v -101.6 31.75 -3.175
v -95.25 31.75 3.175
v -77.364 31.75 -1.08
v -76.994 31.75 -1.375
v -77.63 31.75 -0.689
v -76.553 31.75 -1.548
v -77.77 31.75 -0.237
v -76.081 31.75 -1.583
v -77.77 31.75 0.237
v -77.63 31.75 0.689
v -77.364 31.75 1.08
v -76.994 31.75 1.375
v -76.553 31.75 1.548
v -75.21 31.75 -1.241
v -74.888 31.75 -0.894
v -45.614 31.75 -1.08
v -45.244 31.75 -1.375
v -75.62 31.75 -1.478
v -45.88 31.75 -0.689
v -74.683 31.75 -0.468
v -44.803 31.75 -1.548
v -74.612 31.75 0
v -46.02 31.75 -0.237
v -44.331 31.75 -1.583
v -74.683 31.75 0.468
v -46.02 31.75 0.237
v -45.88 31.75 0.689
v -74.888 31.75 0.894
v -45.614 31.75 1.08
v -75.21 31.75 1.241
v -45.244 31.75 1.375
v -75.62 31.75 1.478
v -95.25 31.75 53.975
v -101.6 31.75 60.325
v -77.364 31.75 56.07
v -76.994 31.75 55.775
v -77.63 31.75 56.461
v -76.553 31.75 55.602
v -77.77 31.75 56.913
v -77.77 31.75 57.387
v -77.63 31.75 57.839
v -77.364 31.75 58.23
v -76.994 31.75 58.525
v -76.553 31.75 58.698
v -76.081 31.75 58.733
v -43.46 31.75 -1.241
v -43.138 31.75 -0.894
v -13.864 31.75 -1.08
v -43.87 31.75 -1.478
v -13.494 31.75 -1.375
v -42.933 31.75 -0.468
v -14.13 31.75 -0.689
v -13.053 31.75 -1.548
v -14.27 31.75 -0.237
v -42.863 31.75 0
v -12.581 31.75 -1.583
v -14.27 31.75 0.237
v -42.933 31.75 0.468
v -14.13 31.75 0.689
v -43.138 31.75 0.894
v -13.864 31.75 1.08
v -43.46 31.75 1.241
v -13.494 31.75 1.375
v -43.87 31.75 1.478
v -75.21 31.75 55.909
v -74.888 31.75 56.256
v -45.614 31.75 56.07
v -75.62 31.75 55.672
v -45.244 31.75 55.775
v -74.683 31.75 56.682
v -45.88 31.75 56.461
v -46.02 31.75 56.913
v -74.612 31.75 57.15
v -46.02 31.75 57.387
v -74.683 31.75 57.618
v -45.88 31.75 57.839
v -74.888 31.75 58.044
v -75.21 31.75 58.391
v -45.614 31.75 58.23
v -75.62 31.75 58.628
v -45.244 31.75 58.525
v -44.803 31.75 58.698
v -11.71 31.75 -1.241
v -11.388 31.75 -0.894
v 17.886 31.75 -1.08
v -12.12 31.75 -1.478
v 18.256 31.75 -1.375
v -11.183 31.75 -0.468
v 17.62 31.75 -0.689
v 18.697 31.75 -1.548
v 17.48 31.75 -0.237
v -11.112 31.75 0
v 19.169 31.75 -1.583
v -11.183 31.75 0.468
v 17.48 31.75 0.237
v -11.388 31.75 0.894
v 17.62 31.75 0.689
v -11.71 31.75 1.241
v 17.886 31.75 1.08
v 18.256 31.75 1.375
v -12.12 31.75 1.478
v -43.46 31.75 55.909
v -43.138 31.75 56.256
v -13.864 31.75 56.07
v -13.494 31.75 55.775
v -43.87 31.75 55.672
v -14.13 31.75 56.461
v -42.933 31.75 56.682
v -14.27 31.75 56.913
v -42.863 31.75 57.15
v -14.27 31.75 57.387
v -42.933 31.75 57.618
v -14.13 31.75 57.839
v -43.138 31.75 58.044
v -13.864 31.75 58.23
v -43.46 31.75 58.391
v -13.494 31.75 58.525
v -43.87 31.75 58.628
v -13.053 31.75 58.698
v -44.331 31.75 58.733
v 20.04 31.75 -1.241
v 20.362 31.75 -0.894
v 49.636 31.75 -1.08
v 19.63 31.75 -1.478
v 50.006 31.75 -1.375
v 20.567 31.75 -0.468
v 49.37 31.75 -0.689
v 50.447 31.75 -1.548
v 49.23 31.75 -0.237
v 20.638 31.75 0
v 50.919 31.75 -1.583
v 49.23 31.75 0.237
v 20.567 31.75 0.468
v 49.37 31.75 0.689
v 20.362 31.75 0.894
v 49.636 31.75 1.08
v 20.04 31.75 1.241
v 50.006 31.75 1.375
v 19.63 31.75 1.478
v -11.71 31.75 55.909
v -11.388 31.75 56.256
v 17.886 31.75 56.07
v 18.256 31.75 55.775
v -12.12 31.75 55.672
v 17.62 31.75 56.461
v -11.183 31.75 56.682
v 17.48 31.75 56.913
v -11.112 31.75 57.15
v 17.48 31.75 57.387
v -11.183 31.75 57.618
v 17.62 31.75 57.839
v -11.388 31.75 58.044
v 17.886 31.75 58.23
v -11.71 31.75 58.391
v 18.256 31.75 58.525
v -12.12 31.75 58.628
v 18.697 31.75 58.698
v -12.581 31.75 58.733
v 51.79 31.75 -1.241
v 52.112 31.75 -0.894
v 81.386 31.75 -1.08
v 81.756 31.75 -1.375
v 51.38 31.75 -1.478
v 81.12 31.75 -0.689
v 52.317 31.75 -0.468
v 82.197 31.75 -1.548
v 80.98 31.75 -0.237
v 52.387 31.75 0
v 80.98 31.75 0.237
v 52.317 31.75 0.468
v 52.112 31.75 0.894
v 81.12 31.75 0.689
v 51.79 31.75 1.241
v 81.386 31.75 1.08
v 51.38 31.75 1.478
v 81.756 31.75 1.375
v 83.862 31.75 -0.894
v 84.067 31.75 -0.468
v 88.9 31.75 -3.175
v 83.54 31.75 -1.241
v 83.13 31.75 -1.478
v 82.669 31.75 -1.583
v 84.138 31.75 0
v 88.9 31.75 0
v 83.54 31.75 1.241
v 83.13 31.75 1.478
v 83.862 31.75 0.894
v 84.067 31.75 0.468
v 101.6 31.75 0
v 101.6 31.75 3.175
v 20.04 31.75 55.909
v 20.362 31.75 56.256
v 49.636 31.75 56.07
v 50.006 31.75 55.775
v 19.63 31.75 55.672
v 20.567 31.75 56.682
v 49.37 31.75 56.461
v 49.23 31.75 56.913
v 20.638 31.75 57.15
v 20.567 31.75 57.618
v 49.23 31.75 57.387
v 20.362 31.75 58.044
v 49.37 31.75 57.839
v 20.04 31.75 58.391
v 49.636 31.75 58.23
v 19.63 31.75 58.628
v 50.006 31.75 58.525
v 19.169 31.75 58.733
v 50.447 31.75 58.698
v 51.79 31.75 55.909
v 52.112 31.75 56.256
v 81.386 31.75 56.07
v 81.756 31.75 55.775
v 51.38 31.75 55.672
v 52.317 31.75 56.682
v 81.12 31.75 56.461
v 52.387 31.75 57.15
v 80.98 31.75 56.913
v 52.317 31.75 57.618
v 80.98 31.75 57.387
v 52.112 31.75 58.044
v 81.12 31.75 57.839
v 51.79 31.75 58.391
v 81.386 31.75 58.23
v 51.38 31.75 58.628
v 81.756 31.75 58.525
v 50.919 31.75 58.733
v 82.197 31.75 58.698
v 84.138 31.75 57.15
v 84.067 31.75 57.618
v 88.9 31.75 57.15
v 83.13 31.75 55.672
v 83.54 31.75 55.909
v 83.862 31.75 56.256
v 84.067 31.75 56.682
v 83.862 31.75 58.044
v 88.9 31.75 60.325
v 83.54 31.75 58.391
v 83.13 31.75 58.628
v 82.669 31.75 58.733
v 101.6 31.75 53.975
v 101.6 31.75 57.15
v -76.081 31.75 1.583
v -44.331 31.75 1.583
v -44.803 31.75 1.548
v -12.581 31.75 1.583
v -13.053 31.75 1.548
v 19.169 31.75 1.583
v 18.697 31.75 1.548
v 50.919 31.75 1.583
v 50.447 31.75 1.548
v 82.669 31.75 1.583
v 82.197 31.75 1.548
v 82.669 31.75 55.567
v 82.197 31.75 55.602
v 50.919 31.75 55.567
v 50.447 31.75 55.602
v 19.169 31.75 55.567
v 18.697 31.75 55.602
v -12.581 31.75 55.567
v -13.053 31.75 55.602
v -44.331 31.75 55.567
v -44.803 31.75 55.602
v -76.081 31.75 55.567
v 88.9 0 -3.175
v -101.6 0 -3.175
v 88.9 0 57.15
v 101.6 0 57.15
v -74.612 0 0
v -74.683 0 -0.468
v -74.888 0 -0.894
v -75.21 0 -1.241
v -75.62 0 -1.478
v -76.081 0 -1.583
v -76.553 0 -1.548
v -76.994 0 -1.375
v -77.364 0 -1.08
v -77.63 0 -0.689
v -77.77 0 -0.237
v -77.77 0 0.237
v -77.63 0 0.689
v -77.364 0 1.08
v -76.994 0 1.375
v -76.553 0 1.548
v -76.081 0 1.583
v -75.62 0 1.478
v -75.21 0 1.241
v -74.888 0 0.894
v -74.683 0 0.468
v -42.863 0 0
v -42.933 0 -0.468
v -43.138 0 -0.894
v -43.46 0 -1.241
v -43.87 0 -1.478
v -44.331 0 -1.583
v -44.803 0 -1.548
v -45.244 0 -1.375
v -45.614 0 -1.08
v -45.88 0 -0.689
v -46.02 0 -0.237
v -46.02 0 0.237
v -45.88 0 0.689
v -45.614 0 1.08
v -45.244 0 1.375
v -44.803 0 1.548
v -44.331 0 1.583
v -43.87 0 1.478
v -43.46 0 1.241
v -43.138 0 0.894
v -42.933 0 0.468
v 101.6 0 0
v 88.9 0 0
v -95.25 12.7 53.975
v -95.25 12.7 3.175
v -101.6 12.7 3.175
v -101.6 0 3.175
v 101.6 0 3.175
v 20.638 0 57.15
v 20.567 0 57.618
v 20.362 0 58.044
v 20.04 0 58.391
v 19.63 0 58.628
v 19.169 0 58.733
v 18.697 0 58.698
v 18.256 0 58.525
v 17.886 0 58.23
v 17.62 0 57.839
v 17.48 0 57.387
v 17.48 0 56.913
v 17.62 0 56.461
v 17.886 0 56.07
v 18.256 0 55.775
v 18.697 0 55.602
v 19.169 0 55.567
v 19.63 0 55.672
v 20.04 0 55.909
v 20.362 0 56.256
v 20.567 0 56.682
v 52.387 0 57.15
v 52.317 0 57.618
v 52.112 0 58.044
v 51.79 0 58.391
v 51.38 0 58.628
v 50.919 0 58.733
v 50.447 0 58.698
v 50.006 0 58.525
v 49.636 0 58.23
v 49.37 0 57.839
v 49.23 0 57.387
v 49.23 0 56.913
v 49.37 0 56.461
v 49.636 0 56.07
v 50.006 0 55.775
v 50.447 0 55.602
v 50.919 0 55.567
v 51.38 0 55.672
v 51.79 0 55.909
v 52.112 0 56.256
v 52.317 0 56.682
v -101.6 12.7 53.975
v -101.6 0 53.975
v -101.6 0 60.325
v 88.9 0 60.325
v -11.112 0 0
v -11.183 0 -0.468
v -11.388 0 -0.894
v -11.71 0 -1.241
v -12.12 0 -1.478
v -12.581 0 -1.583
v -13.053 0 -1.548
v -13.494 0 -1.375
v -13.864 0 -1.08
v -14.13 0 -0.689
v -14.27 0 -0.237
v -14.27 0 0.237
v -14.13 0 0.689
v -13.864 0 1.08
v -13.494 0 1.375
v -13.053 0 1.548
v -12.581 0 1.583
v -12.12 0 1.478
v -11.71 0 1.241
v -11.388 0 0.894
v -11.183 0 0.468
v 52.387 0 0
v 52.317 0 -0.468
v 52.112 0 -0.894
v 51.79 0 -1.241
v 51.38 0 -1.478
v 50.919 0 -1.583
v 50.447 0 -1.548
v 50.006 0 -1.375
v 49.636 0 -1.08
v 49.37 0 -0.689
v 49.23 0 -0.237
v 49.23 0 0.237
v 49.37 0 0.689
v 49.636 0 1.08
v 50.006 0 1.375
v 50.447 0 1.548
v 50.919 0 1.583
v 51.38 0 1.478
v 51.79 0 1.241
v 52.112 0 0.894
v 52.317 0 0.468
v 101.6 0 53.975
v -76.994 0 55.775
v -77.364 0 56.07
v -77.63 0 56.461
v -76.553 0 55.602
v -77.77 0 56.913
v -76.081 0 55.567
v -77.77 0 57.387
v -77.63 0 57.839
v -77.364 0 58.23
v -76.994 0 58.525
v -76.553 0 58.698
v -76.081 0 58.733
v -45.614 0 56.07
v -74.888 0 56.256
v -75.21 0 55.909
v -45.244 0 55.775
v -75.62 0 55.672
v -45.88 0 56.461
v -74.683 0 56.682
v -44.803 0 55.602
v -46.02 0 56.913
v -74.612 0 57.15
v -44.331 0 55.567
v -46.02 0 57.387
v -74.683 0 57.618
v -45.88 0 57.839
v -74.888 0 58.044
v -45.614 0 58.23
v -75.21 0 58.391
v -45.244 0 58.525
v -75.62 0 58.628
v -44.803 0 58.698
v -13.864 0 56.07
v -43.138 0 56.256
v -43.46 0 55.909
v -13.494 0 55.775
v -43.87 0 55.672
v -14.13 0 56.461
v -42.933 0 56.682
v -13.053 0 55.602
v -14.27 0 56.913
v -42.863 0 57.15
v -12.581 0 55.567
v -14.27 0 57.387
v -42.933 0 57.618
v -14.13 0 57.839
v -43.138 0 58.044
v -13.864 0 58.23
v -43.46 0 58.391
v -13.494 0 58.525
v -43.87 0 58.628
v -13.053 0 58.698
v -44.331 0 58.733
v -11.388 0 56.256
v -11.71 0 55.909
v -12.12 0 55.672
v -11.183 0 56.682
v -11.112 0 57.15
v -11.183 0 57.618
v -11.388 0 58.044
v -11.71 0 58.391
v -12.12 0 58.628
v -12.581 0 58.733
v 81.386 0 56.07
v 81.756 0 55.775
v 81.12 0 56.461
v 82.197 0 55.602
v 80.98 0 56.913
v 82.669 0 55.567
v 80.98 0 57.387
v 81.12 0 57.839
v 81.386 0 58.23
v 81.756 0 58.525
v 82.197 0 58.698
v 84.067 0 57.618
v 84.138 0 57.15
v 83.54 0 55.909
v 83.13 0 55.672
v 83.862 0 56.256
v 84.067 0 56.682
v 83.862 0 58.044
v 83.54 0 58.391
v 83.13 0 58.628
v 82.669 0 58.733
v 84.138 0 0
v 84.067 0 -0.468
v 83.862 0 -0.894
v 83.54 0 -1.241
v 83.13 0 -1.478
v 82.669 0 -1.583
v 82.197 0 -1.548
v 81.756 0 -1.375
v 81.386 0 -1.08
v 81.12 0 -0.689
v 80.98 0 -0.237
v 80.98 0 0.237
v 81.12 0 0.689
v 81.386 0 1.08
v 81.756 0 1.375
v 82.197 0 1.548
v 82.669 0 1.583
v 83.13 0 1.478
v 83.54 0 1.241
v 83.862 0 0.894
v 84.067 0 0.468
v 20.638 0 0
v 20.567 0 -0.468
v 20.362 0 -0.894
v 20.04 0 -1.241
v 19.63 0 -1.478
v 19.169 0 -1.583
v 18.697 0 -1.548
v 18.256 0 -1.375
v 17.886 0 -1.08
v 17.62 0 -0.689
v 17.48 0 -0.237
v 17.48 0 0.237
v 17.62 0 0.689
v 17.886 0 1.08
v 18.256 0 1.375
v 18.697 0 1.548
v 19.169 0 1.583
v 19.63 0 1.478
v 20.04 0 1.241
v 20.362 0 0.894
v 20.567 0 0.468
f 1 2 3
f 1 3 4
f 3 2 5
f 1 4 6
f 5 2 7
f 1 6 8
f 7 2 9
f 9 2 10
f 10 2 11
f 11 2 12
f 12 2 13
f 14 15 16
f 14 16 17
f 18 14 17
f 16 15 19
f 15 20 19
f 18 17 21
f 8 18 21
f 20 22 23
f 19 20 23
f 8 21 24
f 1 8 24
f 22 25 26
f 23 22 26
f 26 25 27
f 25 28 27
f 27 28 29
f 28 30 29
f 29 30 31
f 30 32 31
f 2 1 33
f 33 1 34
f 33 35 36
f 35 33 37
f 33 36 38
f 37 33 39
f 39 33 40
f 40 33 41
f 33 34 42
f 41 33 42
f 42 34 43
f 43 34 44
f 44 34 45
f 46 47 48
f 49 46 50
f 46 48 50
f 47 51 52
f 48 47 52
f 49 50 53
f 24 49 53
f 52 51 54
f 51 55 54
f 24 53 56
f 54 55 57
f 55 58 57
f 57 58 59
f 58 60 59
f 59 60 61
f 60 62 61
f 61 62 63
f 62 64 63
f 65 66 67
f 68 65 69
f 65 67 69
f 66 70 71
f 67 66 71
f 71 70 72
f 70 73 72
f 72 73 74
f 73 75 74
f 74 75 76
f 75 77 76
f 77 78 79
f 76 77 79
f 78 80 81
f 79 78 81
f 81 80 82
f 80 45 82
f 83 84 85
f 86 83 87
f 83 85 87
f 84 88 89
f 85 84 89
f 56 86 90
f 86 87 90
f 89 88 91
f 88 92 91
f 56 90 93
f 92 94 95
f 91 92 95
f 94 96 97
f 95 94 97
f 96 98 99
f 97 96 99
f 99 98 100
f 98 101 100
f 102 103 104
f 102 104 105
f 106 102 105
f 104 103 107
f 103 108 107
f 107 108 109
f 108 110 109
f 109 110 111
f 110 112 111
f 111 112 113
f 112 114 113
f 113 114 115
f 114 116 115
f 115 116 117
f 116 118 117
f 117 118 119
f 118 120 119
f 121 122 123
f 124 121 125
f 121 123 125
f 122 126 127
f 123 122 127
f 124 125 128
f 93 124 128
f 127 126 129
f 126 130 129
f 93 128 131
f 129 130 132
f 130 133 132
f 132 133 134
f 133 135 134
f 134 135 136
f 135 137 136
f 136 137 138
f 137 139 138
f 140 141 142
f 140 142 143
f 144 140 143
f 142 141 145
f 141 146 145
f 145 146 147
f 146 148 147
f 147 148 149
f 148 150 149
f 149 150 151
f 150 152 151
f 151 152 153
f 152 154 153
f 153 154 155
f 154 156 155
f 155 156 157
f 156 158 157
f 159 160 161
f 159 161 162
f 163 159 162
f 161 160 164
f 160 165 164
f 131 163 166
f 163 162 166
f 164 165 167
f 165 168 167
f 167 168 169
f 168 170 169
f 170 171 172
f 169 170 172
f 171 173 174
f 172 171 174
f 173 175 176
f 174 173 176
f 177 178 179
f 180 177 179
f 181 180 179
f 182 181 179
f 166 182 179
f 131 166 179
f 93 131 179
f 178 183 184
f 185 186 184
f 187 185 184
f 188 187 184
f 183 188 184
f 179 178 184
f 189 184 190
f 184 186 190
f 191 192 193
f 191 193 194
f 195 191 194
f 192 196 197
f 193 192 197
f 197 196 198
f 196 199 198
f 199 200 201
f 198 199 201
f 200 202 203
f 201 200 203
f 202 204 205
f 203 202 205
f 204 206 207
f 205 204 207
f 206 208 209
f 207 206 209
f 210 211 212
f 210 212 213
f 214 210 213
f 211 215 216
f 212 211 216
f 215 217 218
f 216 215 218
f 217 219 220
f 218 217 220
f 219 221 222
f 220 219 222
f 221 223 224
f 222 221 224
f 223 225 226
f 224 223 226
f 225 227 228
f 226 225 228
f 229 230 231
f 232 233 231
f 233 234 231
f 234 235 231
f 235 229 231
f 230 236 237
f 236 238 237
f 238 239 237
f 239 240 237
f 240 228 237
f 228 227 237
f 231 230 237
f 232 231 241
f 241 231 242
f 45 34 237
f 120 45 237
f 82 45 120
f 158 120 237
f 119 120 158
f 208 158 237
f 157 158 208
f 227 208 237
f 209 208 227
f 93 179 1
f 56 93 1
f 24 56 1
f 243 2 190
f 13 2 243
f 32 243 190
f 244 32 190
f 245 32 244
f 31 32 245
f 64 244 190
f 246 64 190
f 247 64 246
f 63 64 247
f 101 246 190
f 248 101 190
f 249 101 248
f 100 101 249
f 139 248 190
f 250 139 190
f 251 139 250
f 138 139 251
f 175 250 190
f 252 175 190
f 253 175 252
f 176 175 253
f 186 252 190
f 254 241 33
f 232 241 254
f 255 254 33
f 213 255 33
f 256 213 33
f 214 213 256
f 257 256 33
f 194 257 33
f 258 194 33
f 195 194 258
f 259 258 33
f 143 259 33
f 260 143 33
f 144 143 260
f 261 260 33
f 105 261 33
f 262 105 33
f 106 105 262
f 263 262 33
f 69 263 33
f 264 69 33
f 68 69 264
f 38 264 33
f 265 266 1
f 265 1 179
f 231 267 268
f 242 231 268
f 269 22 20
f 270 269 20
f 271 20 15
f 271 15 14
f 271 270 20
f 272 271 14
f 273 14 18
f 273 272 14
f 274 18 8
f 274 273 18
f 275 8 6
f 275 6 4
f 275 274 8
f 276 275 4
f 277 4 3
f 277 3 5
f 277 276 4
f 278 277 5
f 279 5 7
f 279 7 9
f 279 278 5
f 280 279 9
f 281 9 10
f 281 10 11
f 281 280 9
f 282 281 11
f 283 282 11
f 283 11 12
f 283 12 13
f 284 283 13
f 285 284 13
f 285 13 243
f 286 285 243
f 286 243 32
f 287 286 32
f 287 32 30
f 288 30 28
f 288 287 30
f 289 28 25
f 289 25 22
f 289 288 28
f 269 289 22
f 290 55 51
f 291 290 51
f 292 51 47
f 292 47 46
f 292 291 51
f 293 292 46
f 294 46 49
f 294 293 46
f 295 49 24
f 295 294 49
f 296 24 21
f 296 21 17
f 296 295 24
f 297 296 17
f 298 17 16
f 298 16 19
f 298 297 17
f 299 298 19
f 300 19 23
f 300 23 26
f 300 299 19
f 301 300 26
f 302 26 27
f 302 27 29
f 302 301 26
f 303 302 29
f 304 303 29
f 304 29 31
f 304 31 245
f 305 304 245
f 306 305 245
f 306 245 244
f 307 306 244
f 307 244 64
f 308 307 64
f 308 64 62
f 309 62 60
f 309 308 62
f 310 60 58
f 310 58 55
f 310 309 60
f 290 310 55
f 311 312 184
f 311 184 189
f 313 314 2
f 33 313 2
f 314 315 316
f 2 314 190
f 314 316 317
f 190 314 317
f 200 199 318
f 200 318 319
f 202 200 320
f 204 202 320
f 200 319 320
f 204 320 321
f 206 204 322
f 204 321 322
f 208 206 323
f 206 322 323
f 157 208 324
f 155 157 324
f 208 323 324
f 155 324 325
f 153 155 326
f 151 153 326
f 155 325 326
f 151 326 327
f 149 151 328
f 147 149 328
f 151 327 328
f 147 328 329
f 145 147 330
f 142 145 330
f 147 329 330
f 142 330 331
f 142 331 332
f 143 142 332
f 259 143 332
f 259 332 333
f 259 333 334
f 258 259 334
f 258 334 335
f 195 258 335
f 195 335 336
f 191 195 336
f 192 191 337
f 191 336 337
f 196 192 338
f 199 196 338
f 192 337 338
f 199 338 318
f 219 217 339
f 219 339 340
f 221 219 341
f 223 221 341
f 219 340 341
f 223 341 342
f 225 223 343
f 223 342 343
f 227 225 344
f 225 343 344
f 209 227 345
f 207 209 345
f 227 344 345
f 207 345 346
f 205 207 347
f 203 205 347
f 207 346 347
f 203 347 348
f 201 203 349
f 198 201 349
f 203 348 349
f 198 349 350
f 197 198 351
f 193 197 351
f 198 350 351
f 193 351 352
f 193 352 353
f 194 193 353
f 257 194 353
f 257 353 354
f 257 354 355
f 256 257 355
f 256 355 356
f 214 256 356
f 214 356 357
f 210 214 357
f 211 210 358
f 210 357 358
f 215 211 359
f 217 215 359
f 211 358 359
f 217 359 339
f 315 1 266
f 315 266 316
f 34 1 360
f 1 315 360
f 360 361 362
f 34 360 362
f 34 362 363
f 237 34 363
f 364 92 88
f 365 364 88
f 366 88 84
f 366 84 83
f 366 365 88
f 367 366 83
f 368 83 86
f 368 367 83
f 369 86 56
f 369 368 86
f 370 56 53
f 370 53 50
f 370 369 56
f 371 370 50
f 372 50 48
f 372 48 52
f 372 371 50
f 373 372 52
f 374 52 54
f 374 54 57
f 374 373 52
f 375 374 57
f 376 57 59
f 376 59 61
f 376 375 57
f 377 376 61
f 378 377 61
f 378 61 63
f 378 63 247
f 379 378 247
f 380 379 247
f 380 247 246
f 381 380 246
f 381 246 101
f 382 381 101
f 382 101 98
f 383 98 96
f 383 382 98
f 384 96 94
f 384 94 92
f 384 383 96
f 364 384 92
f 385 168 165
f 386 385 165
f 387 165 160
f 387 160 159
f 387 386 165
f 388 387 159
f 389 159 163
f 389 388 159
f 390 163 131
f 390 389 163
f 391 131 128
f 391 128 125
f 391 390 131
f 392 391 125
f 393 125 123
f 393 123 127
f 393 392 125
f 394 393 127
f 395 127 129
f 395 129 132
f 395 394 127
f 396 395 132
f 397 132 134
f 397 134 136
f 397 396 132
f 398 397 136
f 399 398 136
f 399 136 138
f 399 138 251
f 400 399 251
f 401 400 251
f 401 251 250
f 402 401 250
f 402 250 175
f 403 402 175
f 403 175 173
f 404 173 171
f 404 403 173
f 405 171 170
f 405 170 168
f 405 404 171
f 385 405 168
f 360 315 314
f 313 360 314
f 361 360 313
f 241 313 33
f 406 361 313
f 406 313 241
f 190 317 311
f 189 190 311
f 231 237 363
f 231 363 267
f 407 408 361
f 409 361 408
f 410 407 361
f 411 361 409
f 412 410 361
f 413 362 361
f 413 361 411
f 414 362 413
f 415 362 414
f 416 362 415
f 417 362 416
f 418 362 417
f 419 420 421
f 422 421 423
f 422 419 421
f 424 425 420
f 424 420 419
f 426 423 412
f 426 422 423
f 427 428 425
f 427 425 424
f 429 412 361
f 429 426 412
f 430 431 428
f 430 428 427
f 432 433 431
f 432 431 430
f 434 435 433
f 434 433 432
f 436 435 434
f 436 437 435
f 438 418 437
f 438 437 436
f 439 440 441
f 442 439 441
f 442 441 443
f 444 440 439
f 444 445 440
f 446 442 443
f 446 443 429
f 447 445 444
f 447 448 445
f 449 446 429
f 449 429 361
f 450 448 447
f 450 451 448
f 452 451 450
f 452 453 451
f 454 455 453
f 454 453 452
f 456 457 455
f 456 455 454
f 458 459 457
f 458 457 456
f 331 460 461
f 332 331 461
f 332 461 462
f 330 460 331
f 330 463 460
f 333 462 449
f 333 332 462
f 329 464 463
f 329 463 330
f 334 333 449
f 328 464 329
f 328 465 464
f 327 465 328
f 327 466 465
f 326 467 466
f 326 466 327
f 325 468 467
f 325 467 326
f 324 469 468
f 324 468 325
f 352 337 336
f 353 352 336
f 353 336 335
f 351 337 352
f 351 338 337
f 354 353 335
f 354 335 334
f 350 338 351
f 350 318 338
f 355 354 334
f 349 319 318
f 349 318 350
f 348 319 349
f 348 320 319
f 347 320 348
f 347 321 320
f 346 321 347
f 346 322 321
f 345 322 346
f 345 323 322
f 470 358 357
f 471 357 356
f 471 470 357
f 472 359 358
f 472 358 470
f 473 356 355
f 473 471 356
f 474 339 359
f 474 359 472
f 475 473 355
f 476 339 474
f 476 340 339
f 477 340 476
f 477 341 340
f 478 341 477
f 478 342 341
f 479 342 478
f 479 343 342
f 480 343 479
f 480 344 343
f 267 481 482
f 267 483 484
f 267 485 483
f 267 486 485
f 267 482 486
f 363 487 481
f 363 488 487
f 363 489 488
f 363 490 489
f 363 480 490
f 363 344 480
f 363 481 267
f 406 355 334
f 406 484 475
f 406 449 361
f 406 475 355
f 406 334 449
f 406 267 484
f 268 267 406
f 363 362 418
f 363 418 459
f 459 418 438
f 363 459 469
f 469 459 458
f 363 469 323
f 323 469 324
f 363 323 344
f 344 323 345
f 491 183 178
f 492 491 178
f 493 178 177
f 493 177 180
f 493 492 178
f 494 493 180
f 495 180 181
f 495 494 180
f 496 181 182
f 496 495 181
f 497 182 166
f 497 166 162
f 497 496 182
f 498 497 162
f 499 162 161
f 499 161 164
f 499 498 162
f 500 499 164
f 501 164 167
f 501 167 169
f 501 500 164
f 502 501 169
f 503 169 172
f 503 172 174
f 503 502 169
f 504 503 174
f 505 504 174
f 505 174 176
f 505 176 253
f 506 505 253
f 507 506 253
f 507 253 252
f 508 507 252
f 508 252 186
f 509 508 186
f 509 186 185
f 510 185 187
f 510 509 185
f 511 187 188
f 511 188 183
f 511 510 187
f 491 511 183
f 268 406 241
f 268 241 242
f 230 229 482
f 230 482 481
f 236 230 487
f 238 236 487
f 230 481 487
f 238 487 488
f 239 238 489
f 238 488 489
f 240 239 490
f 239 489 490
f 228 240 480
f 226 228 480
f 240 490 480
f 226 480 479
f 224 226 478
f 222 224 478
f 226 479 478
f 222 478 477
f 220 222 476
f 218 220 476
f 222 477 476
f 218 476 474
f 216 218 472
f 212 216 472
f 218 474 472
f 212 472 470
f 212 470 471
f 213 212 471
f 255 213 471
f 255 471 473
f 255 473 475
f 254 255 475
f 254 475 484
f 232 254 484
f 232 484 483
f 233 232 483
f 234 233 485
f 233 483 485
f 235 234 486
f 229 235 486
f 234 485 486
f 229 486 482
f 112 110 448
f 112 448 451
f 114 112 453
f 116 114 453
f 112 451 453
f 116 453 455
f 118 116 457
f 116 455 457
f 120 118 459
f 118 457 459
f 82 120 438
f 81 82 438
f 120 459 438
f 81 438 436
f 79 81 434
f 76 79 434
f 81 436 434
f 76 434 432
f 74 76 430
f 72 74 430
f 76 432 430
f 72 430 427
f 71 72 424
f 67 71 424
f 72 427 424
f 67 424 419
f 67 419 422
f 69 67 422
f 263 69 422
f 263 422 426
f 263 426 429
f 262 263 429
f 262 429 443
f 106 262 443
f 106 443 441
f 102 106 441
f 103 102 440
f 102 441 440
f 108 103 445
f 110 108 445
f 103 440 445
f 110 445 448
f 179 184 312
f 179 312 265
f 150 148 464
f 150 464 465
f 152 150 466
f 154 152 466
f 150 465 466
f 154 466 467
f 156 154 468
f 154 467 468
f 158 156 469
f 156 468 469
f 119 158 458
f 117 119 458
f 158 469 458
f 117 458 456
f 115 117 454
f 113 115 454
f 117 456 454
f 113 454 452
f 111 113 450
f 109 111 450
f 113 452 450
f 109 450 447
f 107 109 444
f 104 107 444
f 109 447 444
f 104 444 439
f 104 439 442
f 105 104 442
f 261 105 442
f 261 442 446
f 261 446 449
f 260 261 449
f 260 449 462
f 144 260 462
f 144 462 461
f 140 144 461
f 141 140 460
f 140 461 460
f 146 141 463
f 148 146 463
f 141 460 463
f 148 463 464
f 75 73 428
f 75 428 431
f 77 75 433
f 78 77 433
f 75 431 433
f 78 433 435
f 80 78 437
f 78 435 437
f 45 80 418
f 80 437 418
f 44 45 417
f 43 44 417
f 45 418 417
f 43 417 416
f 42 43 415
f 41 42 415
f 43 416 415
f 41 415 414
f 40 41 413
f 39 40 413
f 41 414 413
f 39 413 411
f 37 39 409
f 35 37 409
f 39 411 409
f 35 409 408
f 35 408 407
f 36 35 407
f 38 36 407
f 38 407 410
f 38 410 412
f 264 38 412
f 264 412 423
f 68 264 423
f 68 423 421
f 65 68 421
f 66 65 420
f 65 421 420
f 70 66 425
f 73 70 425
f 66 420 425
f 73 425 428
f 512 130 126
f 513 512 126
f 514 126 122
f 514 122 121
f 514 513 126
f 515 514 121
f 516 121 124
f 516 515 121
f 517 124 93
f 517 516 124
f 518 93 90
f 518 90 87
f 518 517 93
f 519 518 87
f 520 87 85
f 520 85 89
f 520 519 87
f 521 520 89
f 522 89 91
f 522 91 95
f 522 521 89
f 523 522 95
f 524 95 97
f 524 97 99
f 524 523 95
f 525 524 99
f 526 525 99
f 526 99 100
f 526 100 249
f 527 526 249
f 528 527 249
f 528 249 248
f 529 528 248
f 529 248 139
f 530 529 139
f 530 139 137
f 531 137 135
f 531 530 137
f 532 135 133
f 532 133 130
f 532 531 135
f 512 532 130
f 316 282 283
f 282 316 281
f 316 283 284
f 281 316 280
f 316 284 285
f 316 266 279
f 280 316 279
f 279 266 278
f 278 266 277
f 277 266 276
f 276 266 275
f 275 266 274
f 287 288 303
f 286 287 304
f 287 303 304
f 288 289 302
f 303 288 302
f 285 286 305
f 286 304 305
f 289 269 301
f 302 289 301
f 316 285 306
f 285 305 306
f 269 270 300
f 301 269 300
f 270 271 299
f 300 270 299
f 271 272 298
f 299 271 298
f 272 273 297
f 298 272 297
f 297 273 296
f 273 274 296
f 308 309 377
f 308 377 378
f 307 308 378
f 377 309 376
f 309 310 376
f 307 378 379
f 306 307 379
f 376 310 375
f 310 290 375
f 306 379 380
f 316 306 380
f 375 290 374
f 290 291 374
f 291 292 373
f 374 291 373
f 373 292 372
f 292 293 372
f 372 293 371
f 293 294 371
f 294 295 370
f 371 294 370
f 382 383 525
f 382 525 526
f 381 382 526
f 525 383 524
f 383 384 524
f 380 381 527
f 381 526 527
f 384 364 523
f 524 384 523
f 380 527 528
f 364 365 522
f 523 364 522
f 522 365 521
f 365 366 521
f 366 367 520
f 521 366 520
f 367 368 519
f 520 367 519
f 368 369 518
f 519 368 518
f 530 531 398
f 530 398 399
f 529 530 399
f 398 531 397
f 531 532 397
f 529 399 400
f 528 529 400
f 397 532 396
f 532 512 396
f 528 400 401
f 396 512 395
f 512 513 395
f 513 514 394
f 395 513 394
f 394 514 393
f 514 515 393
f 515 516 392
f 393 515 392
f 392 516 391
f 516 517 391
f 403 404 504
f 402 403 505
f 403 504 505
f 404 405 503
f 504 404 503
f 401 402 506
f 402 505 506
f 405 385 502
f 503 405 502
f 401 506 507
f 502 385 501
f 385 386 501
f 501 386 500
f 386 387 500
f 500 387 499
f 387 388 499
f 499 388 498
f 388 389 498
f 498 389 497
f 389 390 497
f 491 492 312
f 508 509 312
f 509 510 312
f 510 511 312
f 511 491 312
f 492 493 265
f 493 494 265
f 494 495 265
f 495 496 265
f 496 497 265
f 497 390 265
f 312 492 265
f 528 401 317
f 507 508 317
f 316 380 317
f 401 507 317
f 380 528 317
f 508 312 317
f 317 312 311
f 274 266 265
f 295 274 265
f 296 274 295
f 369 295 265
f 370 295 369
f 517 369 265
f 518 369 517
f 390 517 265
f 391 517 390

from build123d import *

# Parameters (mm, degrees)
SKETCH2_W           = 203.2
SKETCH2_H           = 6.35
SKETCH2_R           = 1.5875
BOSS_EXTRUDE1_DEPTH = 31.75
SKETCH4_W           = 6.35
SKETCH4_H           = 19.05
BOSS_EXTRUDE2_DEPTH = 50.8
SKETCH6_W           = 12.7
SKETCH6_H           = 3.175
CUT_EXTRUDE1_DEPTH  = 32.75


with BuildPart() as part:
    # Sketch2 → Boss-Extrude1 (new body)
    with BuildSketch(Plane(origin=(0, 0, 0), x_dir=(1, 0, 0), z_dir=(0, 1, 0))):
        Rectangle(SKETCH2_W, SKETCH2_H)
        with Locations((-76.2, 0)):
            Circle(SKETCH2_R, mode=Mode.SUBTRACT)
        with Locations((-44.45, 0)):
            Circle(SKETCH2_R, mode=Mode.SUBTRACT)
        with Locations((-12.7, 0)):
            Circle(SKETCH2_R, mode=Mode.SUBTRACT)
        with Locations((19.05, 0)):
            Circle(SKETCH2_R, mode=Mode.SUBTRACT)
        with Locations((50.8, 0)):
            Circle(SKETCH2_R, mode=Mode.SUBTRACT)
        with Locations((82.55, 0)):
            Circle(SKETCH2_R, mode=Mode.SUBTRACT)
    boss_extrude1 = extrude(amount=BOSS_EXTRUDE1_DEPTH)

    # Sketch4 → Boss-Extrude2 (add)
    with BuildSketch(Plane.XY.offset(3.175)):
        with Locations((-98.425, 22.225)):
            Rectangle(SKETCH4_W, SKETCH4_H)
    extrude(amount=BOSS_EXTRUDE2_DEPTH)

    # Mirror1: Boss-Extrude1 across plane
    add(boss_extrude1.mirror(Plane.XY.offset(28.575)))

    # Sketch6 → Cut-Extrude1 (cut, through all)
    with BuildSketch(Plane(origin=(0, 31.75, 0), x_dir=(1, 0, 0), z_dir=(0, 1, 0))):
        with Locations((95.25, 1.5875)):
            Rectangle(SKETCH6_W, SKETCH6_H)
        with Locations((95.25, -58.7375)):
            Rectangle(SKETCH6_W, SKETCH6_H)
    extrude(amount=-CUT_EXTRUDE1_DEPTH, mode=Mode.SUBTRACT)


solid = part.part
